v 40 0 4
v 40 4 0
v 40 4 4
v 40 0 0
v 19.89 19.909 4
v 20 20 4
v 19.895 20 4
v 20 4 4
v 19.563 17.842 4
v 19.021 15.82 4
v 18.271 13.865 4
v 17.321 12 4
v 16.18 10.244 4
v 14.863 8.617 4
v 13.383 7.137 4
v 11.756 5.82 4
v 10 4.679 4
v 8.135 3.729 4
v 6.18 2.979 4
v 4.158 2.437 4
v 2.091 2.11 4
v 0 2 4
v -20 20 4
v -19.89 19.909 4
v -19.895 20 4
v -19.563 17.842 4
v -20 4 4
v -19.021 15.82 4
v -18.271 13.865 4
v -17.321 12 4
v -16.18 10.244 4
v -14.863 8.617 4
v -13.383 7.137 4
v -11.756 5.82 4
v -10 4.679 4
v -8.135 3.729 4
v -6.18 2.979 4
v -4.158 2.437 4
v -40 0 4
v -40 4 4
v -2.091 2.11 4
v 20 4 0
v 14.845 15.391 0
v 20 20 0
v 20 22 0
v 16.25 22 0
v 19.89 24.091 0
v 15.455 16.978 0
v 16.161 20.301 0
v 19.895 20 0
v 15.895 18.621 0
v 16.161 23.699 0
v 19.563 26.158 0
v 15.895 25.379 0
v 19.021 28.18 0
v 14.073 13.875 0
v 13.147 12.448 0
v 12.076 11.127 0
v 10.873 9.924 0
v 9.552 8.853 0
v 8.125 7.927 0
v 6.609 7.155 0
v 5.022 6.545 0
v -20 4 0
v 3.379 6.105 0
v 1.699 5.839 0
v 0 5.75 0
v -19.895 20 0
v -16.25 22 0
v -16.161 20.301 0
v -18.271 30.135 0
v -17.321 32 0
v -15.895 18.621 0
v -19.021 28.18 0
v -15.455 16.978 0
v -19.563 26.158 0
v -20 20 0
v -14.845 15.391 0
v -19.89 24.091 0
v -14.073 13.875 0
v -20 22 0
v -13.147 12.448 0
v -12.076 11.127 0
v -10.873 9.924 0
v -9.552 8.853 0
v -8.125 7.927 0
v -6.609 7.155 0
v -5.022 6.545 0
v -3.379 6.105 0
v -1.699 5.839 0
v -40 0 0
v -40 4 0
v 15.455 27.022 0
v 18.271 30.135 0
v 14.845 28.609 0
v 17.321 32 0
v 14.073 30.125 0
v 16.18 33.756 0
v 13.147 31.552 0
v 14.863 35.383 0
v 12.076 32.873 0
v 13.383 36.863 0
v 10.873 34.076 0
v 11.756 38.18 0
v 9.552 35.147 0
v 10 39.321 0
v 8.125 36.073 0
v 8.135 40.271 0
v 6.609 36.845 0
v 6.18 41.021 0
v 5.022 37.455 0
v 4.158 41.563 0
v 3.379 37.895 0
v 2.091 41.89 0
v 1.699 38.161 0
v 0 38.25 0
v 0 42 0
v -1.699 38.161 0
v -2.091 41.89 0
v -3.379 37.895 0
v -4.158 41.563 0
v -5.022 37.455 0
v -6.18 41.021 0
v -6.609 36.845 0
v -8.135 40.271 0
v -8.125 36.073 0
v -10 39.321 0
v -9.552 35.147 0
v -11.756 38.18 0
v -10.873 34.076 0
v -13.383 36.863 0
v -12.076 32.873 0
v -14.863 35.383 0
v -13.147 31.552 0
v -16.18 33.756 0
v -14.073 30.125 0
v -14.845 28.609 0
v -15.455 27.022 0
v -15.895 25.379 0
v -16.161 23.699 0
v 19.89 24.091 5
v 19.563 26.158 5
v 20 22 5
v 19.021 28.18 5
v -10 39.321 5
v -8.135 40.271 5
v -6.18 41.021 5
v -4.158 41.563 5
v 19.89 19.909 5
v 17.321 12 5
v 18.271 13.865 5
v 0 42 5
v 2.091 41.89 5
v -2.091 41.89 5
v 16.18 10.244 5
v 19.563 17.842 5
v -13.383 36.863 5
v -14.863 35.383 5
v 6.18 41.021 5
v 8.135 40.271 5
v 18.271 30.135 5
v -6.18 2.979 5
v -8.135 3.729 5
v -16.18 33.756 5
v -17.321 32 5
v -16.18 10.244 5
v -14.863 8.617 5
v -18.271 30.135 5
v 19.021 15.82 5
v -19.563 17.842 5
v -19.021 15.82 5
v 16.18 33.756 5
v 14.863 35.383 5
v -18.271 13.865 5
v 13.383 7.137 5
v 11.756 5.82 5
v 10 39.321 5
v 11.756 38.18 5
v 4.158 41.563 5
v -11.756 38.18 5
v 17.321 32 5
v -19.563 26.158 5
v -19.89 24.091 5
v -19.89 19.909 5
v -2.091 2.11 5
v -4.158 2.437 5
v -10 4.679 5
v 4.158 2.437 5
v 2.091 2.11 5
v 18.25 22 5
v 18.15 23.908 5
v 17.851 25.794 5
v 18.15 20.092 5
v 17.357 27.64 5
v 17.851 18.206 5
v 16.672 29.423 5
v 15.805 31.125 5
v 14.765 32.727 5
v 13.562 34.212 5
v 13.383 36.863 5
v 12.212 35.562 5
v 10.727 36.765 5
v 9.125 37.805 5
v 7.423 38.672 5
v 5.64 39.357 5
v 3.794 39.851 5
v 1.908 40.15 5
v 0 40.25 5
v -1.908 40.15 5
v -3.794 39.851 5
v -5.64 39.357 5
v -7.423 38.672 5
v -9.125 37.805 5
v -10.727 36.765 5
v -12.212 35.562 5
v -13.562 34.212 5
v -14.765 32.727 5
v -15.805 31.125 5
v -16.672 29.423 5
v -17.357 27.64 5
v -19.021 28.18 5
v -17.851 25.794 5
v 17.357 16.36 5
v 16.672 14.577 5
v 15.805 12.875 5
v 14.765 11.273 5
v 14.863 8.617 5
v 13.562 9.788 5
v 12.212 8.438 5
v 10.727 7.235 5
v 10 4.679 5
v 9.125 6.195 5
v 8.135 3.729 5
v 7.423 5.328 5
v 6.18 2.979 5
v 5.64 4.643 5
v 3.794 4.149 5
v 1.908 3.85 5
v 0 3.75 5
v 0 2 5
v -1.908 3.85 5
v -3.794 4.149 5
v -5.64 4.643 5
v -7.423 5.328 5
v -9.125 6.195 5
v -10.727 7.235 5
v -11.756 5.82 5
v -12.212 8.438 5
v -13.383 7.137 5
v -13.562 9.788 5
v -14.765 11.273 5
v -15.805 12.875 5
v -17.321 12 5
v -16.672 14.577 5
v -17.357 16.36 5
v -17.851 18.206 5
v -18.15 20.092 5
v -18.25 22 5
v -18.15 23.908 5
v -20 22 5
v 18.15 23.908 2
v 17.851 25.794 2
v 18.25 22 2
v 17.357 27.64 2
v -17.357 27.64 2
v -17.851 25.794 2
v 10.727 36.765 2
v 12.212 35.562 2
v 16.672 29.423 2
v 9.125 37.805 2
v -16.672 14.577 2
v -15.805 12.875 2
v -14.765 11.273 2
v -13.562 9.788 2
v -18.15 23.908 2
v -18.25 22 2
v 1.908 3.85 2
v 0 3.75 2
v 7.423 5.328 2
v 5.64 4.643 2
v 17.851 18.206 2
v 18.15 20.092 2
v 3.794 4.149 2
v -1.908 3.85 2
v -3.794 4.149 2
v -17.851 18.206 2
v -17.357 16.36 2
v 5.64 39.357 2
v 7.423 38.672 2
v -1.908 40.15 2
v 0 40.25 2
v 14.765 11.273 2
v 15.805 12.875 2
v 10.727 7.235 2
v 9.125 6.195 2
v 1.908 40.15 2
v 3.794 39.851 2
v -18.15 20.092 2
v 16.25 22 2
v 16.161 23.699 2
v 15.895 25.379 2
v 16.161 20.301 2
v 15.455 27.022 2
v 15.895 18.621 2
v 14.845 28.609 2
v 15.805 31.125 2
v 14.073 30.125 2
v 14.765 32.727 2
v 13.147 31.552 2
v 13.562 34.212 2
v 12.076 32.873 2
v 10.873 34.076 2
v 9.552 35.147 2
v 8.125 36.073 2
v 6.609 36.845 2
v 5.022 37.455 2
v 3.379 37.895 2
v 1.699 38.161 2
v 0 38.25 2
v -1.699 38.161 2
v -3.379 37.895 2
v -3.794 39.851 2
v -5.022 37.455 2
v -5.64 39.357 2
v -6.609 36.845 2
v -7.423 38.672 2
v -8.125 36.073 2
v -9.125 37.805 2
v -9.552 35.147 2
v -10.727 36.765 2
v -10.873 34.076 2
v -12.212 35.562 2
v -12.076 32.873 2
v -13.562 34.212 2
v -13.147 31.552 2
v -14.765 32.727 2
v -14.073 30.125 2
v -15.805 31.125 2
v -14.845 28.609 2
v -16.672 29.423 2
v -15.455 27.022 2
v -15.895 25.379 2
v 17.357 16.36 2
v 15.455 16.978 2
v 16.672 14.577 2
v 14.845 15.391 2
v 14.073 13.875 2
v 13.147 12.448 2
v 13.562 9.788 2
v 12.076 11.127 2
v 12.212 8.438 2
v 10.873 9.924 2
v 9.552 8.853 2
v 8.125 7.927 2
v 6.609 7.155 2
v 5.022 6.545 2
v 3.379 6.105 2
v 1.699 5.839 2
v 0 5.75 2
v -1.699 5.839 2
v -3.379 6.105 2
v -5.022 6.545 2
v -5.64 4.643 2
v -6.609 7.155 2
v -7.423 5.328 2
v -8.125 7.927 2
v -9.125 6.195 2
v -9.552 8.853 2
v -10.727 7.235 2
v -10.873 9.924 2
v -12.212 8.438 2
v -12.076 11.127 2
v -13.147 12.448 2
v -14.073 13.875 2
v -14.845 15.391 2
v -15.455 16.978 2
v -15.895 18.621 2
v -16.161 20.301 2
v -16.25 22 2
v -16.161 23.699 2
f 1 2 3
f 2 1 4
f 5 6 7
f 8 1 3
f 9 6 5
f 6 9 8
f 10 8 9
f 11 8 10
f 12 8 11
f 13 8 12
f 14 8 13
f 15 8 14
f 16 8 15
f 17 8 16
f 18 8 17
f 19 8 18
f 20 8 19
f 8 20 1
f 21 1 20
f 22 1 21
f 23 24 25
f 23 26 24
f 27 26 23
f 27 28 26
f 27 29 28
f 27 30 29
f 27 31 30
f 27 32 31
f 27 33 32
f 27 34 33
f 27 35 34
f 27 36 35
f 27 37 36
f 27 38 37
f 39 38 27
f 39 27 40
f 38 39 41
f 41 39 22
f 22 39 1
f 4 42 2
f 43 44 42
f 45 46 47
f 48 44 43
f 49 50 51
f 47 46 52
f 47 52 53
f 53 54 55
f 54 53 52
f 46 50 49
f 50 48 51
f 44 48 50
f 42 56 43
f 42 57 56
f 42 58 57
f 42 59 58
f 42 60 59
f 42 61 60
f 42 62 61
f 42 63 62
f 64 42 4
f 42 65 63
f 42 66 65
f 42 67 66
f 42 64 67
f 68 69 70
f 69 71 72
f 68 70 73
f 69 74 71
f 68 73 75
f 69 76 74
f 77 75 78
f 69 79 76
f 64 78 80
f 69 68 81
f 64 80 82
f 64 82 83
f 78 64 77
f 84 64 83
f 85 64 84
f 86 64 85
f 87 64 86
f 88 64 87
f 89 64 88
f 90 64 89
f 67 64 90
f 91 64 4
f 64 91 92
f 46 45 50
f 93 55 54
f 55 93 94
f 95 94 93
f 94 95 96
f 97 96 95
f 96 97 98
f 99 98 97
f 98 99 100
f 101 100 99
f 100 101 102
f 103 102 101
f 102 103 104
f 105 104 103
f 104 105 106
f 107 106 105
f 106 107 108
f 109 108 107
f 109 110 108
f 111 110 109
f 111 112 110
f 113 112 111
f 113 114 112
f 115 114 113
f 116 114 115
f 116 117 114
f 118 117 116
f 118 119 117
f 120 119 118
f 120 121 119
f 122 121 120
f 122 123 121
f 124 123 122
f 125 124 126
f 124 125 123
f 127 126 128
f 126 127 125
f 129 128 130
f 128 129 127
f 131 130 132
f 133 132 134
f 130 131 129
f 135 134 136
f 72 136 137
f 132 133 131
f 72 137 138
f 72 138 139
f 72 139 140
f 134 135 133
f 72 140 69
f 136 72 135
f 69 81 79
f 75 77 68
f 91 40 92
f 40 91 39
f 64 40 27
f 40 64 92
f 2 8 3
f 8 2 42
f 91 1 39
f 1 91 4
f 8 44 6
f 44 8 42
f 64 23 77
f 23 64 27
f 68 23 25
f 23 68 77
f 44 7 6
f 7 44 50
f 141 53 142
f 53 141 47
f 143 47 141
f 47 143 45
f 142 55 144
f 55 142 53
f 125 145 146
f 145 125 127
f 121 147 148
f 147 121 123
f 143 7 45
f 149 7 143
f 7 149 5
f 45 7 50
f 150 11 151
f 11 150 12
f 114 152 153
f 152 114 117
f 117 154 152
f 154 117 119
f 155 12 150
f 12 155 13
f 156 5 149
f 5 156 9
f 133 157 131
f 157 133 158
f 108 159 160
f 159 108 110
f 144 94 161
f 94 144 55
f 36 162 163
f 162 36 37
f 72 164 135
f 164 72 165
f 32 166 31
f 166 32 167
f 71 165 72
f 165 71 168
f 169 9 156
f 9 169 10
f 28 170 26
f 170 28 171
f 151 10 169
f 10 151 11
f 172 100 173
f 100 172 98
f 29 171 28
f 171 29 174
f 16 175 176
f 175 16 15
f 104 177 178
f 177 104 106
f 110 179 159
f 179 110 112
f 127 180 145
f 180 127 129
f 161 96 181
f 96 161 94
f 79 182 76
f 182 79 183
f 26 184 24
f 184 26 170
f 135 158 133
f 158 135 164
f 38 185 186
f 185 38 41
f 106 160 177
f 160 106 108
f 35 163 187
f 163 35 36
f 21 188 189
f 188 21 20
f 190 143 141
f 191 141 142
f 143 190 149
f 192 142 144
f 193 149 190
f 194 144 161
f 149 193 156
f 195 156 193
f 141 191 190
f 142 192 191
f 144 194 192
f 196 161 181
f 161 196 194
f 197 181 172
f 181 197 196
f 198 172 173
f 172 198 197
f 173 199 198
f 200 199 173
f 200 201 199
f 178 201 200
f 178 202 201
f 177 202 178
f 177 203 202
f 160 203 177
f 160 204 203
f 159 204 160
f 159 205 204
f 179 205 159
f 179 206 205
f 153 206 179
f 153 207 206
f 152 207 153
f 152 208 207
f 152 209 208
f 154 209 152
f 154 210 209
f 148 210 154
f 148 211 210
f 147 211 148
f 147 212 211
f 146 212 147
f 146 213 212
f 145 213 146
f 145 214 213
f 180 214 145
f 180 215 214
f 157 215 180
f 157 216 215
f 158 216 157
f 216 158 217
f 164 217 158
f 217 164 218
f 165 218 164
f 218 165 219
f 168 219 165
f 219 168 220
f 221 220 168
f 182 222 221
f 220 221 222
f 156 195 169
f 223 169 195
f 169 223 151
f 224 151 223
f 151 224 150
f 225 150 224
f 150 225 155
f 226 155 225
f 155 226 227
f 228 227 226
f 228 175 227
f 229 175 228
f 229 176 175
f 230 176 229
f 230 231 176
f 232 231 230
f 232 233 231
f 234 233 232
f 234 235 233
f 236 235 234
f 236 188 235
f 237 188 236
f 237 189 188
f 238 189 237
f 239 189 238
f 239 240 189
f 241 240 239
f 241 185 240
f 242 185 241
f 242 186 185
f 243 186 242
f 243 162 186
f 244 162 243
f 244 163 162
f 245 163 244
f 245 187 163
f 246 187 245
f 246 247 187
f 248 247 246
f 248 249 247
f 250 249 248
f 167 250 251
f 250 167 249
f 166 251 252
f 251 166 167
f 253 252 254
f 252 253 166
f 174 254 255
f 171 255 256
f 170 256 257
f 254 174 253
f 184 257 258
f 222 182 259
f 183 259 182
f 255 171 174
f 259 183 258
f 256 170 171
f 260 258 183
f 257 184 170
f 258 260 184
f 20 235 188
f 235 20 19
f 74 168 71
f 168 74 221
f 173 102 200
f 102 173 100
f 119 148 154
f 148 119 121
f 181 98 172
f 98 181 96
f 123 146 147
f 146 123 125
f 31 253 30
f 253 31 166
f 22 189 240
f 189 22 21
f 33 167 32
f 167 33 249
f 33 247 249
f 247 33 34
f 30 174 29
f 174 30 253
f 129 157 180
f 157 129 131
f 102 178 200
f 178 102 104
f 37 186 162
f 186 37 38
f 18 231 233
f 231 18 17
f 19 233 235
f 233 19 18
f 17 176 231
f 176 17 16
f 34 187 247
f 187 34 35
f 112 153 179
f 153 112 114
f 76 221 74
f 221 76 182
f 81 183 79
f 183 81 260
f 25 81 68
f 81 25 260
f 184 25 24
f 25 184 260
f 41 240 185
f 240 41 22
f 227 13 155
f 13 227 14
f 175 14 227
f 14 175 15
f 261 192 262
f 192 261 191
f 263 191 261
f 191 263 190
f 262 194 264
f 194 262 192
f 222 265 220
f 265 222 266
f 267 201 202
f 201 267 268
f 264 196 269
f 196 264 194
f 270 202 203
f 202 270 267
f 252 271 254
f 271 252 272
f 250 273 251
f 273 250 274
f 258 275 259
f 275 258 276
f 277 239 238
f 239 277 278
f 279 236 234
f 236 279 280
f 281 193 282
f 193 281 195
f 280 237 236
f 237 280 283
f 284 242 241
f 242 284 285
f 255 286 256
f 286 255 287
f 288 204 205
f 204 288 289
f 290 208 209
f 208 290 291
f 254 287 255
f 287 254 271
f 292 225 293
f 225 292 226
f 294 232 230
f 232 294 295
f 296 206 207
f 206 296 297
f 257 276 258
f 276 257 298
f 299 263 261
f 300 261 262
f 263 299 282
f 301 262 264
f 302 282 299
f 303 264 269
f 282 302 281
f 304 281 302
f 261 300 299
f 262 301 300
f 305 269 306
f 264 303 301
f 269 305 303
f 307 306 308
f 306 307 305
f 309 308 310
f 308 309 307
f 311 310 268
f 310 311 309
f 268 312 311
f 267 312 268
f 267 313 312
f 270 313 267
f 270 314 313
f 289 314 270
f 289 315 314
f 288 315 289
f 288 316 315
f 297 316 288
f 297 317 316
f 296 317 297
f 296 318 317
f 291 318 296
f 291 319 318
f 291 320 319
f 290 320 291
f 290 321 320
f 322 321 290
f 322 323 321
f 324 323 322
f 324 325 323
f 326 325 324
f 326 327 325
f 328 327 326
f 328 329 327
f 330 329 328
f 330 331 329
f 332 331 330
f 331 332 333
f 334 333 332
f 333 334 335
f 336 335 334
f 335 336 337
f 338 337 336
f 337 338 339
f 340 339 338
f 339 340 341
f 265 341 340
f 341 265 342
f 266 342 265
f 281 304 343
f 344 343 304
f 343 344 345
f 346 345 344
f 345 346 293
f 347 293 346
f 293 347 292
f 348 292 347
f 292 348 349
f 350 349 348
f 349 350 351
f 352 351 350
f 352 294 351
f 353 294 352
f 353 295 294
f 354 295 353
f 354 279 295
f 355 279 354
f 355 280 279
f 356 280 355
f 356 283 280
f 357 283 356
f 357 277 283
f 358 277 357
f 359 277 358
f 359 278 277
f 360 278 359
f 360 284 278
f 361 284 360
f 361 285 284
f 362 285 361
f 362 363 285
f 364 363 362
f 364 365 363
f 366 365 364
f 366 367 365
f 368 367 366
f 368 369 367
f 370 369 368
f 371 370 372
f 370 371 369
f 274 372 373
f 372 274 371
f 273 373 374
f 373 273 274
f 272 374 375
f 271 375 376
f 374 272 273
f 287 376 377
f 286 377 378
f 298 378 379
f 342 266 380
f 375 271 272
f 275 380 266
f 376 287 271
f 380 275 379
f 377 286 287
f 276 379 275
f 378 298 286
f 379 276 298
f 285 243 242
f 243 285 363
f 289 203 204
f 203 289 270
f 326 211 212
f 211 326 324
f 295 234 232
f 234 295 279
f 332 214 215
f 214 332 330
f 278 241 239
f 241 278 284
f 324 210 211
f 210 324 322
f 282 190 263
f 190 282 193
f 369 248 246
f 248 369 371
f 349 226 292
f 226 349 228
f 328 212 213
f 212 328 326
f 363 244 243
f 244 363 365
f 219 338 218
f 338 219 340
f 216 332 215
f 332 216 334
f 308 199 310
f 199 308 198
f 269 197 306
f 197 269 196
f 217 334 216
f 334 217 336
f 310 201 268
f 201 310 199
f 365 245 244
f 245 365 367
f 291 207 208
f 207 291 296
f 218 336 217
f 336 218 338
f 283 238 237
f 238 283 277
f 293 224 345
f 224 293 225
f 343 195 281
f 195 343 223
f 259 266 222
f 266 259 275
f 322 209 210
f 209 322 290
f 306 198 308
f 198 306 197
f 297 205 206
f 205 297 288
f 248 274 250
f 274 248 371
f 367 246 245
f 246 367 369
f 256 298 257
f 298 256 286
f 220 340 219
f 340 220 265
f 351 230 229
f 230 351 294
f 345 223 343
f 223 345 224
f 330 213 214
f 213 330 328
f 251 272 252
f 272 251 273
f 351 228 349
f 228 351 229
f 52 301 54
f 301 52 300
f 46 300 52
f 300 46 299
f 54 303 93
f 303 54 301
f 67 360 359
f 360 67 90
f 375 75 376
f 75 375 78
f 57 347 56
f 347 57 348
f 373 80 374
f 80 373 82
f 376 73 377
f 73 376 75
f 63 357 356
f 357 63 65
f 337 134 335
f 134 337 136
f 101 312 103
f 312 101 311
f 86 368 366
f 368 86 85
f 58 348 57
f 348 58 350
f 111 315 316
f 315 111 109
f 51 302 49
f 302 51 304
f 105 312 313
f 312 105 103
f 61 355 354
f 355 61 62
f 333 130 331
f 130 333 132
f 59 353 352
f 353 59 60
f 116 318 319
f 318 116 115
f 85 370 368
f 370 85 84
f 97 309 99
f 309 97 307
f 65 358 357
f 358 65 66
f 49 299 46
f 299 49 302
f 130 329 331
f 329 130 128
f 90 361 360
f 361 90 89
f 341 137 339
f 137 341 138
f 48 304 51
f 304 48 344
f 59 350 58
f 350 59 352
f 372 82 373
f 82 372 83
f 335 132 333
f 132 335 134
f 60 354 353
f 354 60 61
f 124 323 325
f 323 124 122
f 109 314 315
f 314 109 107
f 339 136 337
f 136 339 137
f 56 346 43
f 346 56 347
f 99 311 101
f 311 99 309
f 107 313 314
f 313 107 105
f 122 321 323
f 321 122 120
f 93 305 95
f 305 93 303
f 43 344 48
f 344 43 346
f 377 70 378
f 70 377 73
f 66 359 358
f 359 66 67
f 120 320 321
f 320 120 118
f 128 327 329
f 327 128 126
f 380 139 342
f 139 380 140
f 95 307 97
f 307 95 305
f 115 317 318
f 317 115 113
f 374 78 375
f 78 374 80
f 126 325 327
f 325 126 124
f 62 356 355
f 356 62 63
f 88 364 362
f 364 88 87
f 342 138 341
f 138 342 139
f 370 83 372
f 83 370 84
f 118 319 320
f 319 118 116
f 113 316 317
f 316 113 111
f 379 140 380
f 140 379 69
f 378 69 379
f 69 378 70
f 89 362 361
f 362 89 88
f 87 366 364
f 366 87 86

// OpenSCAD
difference(){
    union(){
translate([-40,0,0])
cube([80,4,4]);

translate([-20,0,0])
cube([40,20,4]);


    translate([0,22,0])
    cylinder(d=40,h=5,$fn=60);
    }

    translate([0,22,2])
    cylinder(d=36.5,h=10,$fn=60);    
        translate([0,22,-2])
    cylinder(d=32.5,h=10,$fn=60);
    
}
